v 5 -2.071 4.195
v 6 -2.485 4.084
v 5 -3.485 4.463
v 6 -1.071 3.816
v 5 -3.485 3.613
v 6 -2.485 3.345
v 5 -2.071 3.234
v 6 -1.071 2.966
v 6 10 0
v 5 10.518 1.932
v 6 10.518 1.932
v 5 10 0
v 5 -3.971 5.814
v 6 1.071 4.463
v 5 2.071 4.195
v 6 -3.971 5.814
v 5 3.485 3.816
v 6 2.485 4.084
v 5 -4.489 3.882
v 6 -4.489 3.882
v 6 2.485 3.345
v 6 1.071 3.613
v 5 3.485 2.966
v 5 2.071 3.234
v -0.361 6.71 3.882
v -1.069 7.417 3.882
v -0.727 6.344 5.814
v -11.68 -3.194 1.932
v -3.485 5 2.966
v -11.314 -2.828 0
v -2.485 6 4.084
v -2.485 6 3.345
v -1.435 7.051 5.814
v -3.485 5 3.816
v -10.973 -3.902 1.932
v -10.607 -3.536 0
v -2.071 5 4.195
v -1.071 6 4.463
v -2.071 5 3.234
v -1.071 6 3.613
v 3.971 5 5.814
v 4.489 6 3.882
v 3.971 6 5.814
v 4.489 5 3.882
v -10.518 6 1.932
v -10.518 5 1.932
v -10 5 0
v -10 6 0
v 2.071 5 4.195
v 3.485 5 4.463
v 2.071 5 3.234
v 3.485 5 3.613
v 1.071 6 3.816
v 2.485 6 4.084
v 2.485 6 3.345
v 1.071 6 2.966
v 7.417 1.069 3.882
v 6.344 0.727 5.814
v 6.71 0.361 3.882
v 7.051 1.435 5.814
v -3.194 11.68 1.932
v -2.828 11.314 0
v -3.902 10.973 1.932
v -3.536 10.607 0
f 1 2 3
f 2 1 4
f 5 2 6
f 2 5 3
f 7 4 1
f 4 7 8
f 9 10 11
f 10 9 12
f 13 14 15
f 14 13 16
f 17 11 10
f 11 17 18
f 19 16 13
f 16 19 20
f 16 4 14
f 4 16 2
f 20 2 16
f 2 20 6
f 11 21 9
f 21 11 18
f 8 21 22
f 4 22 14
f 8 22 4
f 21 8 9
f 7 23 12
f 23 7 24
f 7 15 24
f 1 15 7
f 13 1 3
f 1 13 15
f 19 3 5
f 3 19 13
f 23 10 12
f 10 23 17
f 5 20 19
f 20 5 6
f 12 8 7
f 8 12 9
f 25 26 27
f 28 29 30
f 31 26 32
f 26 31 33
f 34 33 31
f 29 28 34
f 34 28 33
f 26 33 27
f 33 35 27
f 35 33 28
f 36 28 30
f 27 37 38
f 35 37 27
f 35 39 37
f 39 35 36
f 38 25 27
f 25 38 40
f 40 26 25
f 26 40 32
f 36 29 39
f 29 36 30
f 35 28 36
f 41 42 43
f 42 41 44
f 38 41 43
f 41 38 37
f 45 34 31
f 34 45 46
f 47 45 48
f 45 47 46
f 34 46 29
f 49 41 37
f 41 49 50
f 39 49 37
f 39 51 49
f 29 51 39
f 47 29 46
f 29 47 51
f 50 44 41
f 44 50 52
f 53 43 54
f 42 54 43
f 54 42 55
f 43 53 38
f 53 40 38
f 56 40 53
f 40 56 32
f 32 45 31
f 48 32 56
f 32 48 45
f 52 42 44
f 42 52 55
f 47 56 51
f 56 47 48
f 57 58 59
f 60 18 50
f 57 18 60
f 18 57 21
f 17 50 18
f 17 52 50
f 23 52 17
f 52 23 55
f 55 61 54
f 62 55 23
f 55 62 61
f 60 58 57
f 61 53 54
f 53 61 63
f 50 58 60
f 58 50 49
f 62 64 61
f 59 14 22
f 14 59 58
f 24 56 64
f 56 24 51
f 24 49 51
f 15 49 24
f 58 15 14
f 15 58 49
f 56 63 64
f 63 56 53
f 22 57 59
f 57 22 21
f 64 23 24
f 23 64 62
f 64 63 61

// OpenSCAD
module balken(x=5,y=10,a=1,b=2,l=15,alpha=75,beta=0) translate([x,y,0])rotate([alpha,0,0])rotate(beta)cube([a,b,l]);
difference(){
balken();
for (i = [1:4]) #rotate(-i*45)balken();}
for (i = [5:7]) #rotate(-i*45)balken();
